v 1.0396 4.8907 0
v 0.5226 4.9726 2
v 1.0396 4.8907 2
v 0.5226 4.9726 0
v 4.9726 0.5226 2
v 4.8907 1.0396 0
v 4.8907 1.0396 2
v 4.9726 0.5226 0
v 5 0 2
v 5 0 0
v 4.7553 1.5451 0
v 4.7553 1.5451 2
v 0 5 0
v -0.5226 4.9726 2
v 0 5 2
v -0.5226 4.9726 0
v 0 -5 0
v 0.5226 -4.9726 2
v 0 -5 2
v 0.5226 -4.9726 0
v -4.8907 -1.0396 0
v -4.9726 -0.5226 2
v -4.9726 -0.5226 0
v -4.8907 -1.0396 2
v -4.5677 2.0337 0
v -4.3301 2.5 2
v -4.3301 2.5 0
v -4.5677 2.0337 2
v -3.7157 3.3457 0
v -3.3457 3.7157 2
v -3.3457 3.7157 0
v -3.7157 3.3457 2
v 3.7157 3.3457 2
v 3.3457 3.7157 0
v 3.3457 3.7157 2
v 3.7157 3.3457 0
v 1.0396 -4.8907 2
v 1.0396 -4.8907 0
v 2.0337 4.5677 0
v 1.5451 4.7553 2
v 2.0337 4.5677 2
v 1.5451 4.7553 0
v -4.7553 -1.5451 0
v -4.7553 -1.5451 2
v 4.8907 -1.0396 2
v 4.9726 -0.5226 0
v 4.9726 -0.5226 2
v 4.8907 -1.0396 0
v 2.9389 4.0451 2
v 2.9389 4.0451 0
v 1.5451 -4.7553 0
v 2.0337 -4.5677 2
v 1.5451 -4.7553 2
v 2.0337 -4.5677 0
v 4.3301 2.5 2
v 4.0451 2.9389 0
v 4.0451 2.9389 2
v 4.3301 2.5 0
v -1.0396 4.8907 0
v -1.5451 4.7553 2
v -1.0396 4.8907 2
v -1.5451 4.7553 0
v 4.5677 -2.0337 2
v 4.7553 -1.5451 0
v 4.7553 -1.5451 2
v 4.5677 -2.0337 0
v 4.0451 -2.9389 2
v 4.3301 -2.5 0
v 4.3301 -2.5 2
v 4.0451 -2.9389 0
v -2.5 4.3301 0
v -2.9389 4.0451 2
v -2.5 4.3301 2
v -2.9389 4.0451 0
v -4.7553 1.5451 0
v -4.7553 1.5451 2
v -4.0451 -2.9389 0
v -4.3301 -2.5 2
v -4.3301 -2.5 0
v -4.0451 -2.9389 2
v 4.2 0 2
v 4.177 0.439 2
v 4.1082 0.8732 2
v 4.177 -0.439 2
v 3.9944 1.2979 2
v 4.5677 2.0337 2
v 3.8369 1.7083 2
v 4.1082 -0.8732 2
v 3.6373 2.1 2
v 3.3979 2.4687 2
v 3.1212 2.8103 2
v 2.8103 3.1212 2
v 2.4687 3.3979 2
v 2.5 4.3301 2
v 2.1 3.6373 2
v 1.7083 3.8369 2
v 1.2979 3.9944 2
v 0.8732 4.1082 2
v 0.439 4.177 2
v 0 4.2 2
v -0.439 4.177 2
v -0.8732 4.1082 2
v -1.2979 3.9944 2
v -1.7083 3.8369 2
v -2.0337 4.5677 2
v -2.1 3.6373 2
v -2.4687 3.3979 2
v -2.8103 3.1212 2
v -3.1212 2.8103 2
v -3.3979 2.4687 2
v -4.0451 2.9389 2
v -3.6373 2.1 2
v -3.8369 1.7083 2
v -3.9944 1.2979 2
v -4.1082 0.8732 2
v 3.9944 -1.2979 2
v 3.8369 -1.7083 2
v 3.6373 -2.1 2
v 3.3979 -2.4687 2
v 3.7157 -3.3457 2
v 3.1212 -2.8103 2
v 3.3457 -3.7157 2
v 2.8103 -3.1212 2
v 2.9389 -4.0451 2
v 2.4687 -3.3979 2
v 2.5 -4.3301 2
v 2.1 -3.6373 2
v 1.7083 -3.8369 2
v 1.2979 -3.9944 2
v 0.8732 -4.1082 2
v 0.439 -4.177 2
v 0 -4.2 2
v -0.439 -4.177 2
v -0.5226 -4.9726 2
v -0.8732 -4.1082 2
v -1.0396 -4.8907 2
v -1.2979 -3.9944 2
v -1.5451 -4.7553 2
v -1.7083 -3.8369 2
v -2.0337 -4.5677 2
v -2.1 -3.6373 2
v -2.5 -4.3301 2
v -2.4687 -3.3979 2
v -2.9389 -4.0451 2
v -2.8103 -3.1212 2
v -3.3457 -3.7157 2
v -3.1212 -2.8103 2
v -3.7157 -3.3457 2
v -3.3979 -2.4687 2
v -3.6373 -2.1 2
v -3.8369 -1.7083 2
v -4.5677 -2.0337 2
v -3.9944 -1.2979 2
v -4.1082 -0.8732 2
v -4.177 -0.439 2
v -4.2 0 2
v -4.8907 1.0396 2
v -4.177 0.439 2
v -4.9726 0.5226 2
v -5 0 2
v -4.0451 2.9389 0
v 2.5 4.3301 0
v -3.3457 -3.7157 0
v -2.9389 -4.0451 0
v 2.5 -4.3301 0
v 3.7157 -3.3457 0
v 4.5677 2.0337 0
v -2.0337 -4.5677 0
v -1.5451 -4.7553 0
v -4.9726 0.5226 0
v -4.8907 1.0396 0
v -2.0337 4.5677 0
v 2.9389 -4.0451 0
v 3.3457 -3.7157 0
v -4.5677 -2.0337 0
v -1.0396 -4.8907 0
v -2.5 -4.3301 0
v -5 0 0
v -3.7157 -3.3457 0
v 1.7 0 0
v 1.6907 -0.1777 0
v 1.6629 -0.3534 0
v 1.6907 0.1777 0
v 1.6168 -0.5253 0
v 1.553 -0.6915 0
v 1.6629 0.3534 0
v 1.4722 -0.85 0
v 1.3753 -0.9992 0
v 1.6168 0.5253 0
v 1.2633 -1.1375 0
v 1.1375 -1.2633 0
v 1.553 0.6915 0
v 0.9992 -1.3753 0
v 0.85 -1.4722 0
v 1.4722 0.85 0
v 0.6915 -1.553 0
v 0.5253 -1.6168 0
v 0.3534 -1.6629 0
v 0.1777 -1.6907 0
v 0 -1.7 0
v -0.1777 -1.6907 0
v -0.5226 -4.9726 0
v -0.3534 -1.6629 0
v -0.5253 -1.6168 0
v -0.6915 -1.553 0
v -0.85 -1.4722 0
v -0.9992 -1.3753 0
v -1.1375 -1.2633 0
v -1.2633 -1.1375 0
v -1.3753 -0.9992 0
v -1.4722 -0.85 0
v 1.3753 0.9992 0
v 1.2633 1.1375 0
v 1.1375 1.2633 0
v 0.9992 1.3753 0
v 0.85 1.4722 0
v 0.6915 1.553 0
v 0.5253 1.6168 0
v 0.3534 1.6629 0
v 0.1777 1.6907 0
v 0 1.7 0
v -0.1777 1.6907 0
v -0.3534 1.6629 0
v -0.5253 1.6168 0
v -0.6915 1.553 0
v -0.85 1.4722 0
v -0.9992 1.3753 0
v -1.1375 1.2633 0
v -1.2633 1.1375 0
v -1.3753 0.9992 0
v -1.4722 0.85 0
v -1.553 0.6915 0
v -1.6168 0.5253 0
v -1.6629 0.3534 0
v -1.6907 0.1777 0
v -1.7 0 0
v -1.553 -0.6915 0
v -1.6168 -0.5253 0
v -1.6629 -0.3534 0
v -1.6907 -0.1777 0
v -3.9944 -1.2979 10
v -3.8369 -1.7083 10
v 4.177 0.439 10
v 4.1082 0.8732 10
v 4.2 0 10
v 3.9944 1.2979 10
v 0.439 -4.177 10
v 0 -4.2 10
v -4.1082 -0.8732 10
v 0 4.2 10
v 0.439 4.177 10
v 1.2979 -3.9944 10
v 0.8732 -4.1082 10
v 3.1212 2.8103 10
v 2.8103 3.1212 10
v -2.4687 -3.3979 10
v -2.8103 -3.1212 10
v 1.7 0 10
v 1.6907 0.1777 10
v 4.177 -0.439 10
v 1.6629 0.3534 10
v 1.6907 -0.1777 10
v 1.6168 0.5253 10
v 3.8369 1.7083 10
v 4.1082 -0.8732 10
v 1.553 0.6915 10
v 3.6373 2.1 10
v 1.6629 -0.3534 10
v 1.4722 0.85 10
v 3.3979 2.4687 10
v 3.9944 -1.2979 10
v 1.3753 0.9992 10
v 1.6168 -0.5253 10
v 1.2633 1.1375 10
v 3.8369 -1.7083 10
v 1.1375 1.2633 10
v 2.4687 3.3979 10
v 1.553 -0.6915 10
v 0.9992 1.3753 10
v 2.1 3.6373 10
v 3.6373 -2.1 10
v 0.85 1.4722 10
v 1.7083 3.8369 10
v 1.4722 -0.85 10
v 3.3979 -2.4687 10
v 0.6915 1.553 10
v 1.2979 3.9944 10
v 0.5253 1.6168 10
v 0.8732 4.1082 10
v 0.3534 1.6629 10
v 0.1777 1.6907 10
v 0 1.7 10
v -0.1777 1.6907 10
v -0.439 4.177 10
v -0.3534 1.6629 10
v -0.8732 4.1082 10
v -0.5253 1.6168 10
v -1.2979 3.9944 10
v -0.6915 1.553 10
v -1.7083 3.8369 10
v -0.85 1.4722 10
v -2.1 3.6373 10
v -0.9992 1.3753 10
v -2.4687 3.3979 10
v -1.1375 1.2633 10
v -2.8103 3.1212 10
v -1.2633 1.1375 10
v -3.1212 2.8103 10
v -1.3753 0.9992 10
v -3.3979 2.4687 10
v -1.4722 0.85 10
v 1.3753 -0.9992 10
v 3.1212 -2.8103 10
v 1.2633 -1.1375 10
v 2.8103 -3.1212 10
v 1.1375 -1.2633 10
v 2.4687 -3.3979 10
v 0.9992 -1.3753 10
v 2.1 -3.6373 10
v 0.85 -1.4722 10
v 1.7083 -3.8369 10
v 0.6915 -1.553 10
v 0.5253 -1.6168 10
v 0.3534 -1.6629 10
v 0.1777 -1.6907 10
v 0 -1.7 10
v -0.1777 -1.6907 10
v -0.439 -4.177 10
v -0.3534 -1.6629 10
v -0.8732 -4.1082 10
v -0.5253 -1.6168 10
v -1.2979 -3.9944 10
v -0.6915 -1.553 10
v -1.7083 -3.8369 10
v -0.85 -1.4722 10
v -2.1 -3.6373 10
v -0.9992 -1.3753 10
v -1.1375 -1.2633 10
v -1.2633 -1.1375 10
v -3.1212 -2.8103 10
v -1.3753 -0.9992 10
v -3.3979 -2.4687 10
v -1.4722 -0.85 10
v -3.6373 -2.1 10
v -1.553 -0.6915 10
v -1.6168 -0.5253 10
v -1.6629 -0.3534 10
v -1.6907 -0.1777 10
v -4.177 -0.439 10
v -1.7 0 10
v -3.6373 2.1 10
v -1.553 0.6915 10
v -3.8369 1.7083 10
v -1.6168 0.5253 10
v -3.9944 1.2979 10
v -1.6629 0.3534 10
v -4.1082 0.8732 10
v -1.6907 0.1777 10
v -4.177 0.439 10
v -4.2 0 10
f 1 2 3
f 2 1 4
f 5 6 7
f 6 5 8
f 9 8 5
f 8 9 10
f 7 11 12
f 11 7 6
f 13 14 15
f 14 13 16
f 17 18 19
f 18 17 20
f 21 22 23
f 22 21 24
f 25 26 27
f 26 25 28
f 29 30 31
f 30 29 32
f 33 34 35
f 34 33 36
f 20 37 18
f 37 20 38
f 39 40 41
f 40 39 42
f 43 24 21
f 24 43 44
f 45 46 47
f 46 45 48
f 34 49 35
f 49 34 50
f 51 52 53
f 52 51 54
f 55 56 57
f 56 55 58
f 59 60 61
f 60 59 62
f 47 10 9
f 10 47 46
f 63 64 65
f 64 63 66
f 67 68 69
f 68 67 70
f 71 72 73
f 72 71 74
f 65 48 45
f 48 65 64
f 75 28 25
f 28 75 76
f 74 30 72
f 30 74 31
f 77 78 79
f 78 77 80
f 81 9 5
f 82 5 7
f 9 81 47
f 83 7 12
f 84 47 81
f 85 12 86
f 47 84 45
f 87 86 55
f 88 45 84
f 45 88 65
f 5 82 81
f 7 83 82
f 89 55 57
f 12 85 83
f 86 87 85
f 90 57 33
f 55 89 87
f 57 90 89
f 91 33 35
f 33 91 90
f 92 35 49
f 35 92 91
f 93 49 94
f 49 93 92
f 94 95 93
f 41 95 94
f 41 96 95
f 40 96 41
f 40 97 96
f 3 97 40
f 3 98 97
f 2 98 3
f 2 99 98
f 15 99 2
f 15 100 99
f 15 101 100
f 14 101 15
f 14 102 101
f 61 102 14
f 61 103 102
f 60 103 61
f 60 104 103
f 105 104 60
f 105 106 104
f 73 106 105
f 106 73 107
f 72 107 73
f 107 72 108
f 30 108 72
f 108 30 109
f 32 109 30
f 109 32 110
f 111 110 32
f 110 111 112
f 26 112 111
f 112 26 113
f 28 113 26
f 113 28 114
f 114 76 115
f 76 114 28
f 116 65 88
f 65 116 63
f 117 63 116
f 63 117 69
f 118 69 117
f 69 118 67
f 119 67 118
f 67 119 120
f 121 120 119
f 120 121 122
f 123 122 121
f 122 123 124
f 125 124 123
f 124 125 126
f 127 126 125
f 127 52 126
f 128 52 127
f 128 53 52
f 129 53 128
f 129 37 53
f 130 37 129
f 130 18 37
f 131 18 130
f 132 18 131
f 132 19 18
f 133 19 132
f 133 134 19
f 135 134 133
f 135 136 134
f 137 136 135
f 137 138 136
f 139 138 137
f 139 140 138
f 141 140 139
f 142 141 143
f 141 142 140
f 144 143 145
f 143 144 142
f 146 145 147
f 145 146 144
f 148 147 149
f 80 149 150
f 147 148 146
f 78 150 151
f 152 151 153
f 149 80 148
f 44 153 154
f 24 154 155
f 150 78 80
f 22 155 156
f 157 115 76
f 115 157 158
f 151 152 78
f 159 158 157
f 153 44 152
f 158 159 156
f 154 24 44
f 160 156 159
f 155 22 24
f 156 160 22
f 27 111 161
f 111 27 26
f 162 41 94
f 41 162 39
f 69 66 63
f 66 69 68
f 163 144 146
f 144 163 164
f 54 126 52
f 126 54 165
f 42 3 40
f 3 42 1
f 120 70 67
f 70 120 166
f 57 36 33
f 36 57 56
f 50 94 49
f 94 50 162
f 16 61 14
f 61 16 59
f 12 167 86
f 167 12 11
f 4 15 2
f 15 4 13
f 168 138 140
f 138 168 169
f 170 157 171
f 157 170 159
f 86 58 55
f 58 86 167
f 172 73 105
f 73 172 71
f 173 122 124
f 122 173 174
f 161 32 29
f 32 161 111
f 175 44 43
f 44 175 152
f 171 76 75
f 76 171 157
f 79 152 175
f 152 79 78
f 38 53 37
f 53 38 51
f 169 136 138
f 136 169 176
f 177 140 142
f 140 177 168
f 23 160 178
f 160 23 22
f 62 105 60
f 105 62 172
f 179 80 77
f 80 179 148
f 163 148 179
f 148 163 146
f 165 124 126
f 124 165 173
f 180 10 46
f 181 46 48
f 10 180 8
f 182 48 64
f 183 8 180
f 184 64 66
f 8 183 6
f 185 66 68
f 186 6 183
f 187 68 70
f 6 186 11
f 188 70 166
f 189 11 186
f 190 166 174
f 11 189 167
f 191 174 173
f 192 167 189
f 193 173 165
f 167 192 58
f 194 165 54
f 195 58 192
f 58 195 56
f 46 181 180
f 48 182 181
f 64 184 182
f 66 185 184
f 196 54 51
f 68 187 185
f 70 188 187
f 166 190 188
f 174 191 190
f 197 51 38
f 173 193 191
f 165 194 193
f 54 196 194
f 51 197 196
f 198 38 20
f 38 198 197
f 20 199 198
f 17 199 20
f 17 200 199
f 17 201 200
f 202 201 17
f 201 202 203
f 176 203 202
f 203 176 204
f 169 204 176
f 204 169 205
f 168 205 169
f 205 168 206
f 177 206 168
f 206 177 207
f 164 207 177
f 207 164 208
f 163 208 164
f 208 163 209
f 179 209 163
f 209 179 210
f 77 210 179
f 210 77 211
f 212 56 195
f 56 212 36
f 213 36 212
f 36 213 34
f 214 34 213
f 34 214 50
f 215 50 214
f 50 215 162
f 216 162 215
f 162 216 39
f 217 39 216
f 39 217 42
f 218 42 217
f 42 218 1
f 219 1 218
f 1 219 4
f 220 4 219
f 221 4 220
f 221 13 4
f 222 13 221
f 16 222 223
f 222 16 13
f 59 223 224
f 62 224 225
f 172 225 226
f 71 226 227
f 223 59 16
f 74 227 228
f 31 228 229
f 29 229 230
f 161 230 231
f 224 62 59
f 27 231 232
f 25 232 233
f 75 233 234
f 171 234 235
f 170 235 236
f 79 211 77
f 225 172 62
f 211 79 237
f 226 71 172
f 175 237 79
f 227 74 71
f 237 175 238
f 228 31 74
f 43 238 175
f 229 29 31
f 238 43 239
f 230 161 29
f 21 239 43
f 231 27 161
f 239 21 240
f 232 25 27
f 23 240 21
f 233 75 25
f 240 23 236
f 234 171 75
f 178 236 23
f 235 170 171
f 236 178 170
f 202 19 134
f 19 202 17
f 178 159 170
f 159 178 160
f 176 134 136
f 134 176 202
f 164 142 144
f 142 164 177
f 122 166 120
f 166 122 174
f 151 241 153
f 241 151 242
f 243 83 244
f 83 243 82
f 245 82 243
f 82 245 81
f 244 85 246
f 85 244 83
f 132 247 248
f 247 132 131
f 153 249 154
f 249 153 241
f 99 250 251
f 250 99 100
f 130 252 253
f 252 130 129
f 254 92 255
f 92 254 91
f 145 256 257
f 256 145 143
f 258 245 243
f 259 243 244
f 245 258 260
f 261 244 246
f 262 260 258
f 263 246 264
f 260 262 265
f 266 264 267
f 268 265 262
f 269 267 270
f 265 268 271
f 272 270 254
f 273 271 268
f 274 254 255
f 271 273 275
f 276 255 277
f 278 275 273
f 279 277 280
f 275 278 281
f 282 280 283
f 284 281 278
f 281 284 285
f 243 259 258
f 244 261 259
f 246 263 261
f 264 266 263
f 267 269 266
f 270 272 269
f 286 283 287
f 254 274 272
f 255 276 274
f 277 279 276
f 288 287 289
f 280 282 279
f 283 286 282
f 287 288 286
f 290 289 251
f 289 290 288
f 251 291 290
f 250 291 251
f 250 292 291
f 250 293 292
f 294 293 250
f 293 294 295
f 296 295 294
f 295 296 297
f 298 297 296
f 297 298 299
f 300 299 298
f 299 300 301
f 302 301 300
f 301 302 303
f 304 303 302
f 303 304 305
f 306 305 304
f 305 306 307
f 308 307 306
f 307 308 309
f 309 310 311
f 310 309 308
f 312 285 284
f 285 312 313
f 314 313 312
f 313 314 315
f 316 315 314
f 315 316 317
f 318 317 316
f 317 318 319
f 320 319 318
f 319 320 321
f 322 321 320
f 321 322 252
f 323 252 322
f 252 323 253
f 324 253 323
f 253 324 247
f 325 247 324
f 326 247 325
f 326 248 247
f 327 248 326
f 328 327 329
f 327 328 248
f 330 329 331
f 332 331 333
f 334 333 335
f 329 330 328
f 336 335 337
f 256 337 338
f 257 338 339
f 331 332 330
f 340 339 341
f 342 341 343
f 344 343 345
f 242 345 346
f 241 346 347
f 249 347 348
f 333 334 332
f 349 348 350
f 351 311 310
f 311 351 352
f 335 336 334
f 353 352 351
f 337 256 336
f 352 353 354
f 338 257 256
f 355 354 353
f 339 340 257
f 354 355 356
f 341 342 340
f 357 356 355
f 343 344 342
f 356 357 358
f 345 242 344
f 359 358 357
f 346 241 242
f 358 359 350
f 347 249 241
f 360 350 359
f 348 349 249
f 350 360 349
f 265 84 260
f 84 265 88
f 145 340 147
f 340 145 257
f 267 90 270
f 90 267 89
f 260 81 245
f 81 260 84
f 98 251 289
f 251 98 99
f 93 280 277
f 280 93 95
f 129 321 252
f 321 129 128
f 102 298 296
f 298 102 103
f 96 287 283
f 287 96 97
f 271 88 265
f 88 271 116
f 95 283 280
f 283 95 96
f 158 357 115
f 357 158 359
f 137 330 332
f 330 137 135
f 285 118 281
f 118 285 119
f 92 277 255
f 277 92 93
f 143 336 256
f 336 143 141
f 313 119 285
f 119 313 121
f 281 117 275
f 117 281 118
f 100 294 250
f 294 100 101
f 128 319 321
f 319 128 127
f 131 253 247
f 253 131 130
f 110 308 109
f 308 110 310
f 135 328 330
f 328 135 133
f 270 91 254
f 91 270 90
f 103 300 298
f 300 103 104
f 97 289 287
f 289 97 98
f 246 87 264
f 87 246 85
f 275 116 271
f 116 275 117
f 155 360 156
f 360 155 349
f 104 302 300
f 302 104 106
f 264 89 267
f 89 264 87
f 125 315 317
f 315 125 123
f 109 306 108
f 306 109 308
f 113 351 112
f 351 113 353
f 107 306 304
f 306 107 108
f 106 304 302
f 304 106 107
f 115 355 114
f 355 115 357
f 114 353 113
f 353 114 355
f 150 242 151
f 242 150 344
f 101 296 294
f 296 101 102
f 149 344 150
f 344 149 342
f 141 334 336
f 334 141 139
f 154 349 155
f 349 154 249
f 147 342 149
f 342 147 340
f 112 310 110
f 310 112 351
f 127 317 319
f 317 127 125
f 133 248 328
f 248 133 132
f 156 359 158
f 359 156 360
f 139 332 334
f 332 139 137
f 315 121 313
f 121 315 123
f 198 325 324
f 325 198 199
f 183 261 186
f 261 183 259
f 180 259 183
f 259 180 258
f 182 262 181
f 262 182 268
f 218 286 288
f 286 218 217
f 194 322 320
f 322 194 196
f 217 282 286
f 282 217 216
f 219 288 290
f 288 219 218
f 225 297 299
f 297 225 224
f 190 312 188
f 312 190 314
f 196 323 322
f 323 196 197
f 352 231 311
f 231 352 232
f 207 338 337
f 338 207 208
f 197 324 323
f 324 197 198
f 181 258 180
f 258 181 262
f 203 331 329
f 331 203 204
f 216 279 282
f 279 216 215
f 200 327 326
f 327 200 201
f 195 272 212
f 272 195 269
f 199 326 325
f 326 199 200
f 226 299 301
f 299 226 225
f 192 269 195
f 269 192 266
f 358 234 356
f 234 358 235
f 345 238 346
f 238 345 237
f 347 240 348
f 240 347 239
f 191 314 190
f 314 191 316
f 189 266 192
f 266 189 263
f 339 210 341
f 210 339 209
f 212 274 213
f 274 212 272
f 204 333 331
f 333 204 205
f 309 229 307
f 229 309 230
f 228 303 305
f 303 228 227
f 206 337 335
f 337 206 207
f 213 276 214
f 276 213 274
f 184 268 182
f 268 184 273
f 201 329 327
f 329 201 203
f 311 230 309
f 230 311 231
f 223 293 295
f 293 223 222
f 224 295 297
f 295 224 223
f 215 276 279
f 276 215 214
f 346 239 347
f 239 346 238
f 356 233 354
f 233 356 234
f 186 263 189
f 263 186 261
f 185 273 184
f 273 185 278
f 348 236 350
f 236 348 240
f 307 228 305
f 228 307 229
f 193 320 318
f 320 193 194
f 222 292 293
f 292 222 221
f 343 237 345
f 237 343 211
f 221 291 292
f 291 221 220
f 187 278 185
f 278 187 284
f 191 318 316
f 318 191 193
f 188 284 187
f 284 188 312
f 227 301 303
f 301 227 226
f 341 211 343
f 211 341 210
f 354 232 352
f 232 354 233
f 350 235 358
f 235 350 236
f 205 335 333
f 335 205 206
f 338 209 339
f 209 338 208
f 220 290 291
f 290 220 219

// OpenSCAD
// PCB standoff with mounting base.
$fn = 60;
eps = 0.02;
thread_d = 3.4;
base_d = 10;
height = 10;
body_d = thread_d+5;
difference() {
    union() { cylinder(d=base_d,h=2); cylinder(d=body_d,h=height); }
    translate([0,0,-eps]) cylinder(d=thread_d,h=height+2*eps);
}
